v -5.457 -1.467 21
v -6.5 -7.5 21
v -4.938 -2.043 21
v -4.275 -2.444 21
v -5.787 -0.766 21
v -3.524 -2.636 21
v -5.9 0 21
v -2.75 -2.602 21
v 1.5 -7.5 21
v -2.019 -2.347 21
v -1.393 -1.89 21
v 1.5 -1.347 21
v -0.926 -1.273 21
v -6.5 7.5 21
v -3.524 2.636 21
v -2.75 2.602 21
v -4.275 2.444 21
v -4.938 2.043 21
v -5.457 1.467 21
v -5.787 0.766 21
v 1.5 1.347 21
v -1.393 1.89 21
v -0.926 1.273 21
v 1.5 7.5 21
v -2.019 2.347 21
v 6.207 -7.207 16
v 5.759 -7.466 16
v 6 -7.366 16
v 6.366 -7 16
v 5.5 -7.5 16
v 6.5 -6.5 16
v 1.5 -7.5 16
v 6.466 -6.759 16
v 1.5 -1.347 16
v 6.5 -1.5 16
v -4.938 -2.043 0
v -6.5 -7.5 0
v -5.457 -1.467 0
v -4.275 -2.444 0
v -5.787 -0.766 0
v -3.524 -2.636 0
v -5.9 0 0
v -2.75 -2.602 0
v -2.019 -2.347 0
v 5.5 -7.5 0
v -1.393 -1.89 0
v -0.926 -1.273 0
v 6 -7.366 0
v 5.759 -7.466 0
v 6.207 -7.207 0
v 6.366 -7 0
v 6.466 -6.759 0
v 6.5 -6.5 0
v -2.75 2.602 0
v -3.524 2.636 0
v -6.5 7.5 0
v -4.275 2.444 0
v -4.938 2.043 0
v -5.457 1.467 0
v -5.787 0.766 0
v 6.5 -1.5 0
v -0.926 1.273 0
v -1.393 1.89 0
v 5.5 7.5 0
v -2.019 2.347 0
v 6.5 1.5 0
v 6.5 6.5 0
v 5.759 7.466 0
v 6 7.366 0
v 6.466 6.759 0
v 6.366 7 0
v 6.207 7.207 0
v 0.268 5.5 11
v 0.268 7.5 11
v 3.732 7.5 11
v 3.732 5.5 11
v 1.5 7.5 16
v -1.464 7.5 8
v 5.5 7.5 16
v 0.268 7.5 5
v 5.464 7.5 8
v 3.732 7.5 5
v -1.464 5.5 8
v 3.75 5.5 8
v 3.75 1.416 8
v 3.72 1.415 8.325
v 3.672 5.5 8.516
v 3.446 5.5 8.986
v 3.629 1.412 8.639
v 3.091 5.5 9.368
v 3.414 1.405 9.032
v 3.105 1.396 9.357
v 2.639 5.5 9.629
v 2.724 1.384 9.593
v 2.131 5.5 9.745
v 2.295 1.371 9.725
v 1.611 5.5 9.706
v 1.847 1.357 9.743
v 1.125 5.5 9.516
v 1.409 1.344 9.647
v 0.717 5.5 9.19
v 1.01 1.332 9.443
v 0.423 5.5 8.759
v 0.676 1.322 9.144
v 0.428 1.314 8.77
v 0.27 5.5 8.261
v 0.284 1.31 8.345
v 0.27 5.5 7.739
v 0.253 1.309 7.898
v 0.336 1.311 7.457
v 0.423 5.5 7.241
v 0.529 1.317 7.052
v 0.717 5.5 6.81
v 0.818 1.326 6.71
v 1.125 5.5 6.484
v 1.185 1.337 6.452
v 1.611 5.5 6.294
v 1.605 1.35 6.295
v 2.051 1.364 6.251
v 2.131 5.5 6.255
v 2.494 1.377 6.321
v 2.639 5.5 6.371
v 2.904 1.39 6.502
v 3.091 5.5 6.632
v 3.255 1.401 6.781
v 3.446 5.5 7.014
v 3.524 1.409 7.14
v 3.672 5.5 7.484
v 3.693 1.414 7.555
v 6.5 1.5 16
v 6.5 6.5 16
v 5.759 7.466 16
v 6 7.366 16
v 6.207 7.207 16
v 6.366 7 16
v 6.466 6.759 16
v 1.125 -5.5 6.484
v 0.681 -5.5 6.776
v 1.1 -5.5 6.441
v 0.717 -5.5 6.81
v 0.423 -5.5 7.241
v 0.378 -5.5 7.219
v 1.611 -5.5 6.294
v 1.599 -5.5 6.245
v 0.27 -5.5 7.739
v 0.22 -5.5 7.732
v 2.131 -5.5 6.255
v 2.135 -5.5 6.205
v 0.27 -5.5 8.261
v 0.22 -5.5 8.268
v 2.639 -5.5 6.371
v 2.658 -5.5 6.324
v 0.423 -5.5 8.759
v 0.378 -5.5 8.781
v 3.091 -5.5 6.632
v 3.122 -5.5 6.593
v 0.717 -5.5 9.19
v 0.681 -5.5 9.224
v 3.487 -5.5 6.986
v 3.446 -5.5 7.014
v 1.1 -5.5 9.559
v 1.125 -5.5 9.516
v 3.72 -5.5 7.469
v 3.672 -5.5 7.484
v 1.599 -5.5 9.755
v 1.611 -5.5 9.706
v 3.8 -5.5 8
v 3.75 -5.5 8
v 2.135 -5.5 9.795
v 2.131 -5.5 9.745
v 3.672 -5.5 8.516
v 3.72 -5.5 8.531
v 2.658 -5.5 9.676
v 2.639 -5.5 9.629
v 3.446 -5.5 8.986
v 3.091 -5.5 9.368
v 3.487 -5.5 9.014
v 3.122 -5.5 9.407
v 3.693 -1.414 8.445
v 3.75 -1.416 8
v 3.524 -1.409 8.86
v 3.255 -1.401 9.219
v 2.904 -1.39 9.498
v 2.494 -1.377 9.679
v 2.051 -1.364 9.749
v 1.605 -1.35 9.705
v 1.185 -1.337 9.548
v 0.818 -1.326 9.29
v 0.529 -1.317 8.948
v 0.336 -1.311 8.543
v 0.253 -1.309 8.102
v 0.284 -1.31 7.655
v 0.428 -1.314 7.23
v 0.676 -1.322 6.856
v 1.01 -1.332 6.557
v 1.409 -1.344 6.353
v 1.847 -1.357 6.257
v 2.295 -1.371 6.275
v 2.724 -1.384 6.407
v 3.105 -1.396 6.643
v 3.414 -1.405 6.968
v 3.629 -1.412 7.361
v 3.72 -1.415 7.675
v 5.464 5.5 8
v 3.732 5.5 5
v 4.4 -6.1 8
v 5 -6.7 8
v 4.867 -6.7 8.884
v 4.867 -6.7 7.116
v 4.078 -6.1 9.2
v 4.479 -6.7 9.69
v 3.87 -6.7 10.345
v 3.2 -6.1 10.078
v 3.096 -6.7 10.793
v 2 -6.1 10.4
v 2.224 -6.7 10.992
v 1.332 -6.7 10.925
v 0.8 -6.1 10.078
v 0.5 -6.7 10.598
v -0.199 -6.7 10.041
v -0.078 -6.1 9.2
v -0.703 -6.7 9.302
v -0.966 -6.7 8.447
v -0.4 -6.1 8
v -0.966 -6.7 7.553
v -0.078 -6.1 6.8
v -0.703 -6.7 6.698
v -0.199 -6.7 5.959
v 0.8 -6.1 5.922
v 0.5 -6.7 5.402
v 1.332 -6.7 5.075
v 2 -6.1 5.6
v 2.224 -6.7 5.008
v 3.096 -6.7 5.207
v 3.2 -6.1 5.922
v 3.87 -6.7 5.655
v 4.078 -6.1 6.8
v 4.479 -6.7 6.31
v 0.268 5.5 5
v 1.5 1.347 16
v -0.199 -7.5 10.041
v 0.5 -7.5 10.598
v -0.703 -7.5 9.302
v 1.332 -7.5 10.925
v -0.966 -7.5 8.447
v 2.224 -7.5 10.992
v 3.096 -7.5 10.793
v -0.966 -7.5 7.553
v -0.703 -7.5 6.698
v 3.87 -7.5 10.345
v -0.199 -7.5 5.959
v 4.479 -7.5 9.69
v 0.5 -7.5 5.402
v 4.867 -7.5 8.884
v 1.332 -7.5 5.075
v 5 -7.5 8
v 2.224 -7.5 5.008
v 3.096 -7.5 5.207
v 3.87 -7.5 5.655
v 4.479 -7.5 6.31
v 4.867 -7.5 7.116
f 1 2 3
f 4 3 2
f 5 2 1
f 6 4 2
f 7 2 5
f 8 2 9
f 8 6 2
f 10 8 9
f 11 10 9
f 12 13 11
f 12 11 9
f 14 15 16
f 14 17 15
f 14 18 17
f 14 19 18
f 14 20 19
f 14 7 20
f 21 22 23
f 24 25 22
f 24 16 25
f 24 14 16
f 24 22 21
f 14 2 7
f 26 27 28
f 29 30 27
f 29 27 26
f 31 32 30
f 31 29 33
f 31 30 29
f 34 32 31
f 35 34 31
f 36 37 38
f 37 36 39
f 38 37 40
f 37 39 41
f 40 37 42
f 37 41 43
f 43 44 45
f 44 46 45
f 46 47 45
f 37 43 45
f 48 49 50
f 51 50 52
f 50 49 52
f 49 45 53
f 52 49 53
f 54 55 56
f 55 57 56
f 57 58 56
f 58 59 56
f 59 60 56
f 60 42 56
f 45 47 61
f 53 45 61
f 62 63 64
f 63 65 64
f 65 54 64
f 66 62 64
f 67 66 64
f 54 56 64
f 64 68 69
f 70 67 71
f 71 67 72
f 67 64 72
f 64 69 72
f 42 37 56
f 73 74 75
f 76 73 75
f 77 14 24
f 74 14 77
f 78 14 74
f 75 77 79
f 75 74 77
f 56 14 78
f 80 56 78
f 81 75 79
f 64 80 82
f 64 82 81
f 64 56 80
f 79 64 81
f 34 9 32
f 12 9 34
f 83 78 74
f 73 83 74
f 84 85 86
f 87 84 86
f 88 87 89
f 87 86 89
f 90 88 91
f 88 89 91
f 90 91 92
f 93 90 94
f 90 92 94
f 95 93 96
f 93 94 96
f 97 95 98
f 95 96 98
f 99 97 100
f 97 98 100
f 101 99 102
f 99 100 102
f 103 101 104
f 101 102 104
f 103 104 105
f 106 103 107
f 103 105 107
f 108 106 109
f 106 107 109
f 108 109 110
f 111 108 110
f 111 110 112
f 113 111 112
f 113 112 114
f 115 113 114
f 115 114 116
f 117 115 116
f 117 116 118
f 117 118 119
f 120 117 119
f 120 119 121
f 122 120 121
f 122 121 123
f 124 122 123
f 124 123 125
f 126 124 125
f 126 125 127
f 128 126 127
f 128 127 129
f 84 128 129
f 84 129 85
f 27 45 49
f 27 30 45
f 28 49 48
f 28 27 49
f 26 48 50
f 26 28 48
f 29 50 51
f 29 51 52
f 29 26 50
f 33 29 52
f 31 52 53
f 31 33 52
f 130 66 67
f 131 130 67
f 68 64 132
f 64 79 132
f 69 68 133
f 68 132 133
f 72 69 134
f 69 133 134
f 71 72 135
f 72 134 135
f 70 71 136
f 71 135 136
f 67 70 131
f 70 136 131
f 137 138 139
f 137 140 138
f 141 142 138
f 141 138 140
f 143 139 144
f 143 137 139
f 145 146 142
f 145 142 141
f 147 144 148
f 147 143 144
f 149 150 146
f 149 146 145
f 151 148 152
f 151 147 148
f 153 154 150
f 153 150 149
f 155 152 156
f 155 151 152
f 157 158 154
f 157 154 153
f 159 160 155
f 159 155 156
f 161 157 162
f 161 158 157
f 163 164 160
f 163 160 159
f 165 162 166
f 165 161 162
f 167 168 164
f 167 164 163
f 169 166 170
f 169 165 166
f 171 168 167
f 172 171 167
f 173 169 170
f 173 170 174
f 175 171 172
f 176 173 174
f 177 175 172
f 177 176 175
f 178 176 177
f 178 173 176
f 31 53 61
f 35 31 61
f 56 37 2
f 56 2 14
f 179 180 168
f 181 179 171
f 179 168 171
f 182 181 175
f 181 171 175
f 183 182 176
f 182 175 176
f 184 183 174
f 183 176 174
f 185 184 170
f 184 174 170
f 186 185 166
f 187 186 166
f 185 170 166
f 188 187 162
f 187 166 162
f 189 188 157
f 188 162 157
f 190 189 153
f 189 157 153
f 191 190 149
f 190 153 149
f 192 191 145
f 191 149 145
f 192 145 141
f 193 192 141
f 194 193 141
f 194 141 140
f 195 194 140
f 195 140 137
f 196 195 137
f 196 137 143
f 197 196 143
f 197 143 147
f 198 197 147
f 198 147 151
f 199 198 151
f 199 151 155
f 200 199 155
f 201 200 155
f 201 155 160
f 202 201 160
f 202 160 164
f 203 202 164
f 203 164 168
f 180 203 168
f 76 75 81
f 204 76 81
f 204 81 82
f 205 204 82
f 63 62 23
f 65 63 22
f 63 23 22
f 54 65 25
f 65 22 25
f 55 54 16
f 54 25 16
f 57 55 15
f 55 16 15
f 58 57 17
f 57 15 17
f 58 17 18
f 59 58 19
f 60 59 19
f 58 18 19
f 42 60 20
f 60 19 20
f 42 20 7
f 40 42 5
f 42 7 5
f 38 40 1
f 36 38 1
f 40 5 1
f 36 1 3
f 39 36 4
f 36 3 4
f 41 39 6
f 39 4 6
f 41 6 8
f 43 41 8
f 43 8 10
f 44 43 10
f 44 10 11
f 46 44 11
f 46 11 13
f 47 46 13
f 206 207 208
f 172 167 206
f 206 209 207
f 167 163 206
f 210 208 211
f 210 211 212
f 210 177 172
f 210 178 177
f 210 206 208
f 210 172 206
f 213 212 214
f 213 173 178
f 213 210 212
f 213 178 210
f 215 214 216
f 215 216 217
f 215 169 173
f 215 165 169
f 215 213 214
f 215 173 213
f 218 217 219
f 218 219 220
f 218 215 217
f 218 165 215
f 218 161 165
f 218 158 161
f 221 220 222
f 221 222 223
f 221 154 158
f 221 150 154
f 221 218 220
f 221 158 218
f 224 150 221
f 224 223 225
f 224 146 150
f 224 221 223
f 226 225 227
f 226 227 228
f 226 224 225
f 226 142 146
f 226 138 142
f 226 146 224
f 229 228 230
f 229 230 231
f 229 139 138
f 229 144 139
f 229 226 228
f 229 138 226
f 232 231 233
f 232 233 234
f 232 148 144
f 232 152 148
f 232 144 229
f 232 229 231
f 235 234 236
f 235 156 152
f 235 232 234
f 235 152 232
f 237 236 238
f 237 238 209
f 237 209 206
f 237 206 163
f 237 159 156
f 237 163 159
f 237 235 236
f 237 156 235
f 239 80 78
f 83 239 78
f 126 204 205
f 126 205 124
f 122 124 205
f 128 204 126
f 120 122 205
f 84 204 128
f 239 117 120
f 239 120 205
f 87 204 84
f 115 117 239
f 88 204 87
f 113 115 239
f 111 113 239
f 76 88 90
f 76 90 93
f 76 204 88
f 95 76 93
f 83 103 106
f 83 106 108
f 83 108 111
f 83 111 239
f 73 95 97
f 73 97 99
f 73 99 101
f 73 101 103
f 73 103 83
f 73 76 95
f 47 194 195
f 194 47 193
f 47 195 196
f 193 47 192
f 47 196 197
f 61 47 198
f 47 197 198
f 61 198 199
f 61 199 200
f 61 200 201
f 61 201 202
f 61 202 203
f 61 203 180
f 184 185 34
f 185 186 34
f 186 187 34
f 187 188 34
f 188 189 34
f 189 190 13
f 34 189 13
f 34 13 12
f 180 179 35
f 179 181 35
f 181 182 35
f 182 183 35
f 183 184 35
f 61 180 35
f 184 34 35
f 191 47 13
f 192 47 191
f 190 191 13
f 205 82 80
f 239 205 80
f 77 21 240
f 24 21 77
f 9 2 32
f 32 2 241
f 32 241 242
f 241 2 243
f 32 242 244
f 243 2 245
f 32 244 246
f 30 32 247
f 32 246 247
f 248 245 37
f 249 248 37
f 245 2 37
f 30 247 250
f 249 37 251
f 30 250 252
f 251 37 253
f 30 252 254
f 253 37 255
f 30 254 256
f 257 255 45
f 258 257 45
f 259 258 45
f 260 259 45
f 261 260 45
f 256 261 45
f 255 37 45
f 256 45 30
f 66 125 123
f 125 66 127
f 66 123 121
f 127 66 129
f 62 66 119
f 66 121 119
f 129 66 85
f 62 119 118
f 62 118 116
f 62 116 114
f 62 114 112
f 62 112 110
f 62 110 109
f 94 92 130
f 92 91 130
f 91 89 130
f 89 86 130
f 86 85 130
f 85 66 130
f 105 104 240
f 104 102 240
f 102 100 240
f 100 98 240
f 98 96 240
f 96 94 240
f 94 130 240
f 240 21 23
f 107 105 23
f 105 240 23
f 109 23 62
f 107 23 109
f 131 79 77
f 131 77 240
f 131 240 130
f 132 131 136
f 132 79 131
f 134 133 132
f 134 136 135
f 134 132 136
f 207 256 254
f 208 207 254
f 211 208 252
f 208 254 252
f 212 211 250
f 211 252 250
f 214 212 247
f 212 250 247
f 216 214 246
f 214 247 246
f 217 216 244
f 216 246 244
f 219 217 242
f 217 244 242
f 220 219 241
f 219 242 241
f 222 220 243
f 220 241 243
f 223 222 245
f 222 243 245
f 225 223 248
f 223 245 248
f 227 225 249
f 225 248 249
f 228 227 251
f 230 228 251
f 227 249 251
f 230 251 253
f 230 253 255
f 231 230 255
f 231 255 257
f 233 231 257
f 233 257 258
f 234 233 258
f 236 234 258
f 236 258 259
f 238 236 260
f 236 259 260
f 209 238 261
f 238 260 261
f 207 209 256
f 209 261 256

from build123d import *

# Parameters (mm, degrees)
F0_W      = 13
F0_H      = 15
F1_DEPTH  = 21
F3_DEPTH  = 21
F4_W      = 5
F4_H      = 15
F5_DEPTH  = 5
F6_R      = 1.75
F7_DEPTH  = 42
F8_R      = 1.75
F9_DEPTH  = 2
F10_R     = 3
F10_R_2   = 1.75
F11_DEPTH = 2
F12_SIZE  = 1.2
F13_R     = 1


# Not quite as in the source:
# - an extrude ends at something that could not be found from the text; its depth is read off the source's solid


with BuildPart() as f1:
    # F0 (on Top) → F1 (new body)
    with BuildSketch(Plane.XY):
        Rectangle(F0_W, F0_H)
    extrude(amount=F1_DEPTH)

    # F2 (on face) → F3 (cut, through all)
    with BuildSketch(Plane.XY.offset(21)):
        with BuildLine():
            ThreePointArc((-0.9255449651, -1.272559936), (-0.682675922, -0.6567701872), (-0.6, 0))
            ThreePointArc((-0.6, 0), (-0.682675922, 0.6567701872), (-0.9255449651, 1.272559936))
            Line((-0.9255449651, 1.272559936), (-0.9255449651, -1.272559936))
        make_face()
        with BuildLine():
            ThreePointArc((-0.9255449651, 1.272559936), (-0.682675922, 0.6567701872), (-0.6, 0))
            ThreePointArc((-0.6, 0), (-0.682675922, -0.6567701872), (-0.9255449651, -1.272559936))
            Line((-0.9255449651, -1.272559936), (6.5, -1.5))
            Line((6.5, -1.5), (6.5, 1.5))
            Line((6.5, 1.5), (-0.9255449651, 1.272559936))
        make_face()
        with BuildLine():
            Line((-0.9255449651, -1.272559936), (-0.9255449651, 1.272559936))
            ThreePointArc((-0.9255449651, 1.272559936), (-5.9, 0), (-0.9255449651, -1.272559936))
        make_face()
    extrude(amount=-F3_DEPTH, mode=Mode.SUBTRACT)

    # F4 (on face) → F5 (cut)
    with BuildSketch(Plane.XY.offset(21)):
        with Locations((4, 0)):
            Rectangle(F4_W, F4_H)
    extrude(amount=-F5_DEPTH, mode=Mode.SUBTRACT)

    # F6 (on face) → F7 (cut, through all)
    with BuildSketch(Plane.XZ.offset(7.5)):
        with Locations((2, 8)):
            Circle(F6_R)
    extrude(amount=-F7_DEPTH, mode=Mode.SUBTRACT)

    # F8 (on face) → F9 (cut)
    with BuildSketch(Plane(origin=(0, 7.5, 0), x_dir=(-1, 0, 0), z_dir=(0, 1, 0))):
        Polygon((-0.2679491924, 11), (-3.7320508076, 11), (-5.4641016151, 8), (-3.7320508076, 5), (-0.2679491924, 5), (1.4641016151, 8), align=None)
        with Locations((-2, 8)):
            Circle(F8_R, mode=Mode.SUBTRACT)
    extrude(amount=-F9_DEPTH, mode=Mode.SUBTRACT)

    # F10 (on face) → F11 (cut)
    with BuildSketch(Plane.XZ.offset(7.5)):
        with Locations((2, 8)):
            Circle(F10_R)
        with Locations((2, 8)):
            Circle(F10_R_2, mode=Mode.SUBTRACT)
    extrude(amount=-F11_DEPTH, mode=Mode.SUBTRACT)

    # F12
    f12_edges = [f1.edges().sort_by_distance(p)[0] for p in [
        (-1, -5.5, 8),
    ]]
    chamfer(f12_edges, length=F12_SIZE)

    # F13
    f13_edges = [f1.edges().sort_by_distance(p)[0] for p in [
        (6.5, -7.5, 8),
        (6.5, 7.5, 8),
    ]]
    fillet(f13_edges, radius=F13_R)


solid = f1.part
